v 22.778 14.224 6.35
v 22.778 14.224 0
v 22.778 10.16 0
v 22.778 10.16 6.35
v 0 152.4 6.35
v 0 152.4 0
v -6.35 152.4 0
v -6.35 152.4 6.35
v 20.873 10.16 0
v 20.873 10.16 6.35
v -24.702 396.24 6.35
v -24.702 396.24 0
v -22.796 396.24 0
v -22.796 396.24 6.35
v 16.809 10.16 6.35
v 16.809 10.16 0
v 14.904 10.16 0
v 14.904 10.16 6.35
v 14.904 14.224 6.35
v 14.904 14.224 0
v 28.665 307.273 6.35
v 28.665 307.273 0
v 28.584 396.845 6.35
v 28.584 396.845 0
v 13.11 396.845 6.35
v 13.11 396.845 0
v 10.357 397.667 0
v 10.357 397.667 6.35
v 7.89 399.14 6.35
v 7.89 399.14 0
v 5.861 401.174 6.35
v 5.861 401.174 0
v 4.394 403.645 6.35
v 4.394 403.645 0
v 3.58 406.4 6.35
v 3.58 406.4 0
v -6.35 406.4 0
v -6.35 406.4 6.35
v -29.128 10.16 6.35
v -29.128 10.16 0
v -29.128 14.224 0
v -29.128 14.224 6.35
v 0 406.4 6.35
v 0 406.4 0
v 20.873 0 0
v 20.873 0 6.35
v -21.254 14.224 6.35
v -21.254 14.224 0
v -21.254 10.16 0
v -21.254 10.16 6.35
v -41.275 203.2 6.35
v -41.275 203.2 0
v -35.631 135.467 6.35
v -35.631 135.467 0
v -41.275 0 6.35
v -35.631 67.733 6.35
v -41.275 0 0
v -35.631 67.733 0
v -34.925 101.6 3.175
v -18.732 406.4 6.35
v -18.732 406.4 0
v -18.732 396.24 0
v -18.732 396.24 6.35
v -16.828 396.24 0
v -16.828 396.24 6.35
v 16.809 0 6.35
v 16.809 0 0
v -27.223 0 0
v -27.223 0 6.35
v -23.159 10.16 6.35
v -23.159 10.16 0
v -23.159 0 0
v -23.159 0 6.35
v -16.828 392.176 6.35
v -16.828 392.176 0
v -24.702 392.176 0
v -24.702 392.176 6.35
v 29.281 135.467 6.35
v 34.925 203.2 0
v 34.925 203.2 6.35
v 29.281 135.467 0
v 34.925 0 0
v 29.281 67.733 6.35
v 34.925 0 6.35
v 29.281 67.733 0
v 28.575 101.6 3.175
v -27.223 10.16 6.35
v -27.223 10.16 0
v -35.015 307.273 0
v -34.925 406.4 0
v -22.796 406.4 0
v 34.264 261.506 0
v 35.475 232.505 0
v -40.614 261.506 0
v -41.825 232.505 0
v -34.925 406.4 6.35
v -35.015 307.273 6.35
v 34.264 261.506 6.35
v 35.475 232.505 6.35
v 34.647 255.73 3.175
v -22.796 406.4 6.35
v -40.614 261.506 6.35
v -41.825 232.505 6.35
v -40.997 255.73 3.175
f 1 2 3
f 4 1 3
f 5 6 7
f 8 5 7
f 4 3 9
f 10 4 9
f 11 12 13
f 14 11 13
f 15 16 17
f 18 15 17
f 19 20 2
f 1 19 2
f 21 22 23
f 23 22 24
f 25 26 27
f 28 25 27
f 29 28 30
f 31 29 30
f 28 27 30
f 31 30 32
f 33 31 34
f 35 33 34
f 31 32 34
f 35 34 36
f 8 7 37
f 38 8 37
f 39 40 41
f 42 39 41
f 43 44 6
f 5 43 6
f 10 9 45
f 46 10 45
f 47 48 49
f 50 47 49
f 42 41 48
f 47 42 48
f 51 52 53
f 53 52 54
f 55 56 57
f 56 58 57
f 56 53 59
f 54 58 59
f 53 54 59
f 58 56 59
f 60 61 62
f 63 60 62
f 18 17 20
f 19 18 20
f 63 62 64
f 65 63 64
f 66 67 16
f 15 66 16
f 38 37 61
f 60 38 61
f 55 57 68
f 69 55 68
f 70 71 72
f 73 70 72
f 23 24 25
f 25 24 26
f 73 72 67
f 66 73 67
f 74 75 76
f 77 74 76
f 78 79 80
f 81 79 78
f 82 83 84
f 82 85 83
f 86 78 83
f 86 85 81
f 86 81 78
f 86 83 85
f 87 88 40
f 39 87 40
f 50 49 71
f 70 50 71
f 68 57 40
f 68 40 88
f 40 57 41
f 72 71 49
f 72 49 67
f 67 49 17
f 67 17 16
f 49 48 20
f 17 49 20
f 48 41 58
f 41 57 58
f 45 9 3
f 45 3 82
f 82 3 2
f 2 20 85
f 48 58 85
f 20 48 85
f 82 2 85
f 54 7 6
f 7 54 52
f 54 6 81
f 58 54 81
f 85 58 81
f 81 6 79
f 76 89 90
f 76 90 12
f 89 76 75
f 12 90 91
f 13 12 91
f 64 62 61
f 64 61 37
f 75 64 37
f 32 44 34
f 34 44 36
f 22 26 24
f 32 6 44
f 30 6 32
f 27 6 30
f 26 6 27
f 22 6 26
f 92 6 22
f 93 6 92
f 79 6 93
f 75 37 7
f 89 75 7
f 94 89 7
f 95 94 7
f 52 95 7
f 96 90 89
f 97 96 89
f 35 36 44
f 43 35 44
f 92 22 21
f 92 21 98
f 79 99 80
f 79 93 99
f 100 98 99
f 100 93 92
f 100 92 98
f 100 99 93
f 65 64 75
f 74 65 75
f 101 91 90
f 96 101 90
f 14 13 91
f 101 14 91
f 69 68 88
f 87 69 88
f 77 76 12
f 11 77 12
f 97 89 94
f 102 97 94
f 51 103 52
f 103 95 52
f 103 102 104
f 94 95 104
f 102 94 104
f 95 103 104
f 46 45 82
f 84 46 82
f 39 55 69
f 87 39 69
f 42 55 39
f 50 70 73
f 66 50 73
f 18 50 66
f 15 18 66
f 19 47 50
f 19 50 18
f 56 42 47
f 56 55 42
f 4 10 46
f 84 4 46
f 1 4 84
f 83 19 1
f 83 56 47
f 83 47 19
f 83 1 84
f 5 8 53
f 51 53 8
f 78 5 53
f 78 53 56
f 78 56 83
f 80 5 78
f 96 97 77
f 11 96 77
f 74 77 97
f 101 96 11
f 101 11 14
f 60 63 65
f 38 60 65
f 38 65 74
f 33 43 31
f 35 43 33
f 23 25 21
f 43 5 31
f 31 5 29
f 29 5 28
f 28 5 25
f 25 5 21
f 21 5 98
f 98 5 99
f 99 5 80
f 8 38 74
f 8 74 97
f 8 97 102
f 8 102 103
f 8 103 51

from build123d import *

# Parameters (mm, degrees)
BOSS_EXTRUDE1_DEPTH = 6.35


with BuildPart() as part:
    # Sketch2 → Boss-Extrude1 (new body)
    with BuildSketch(Plane.XY):
        with BuildLine():
            Line((-41.275, 0), (-27.223297828, 0))
            Line((-27.223297828, 0), (-27.223297828, 10.16))
            Line((-27.223297828, 10.16), (-29.128297828, 10.16))
            Line((-29.128297828, 10.16), (-29.128297828, 14.224))
            Line((-29.128297828, 14.224), (-21.254297828, 14.224))
            Line((-21.254297828, 14.224), (-21.254297828, 10.16))
            Line((-21.254297828, 10.16), (-23.159297828, 10.16))
            Line((-23.159297828, 10.16), (-23.159297828, 0))
            Line((-23.159297828, 0), (16.809297828, 0))
            Line((16.809297828, 0), (16.809297828, 10.16))
            Line((16.809297828, 10.16), (14.904297828, 10.16))
            Line((14.904297828, 10.16), (14.904297828, 14.224))
            Line((14.904297828, 14.224), (22.778297828, 14.224))
            Line((22.778297828, 14.224), (22.778297828, 10.16))
            Line((22.778297828, 10.16), (20.873297828, 10.16))
            Line((20.873297828, 10.16), (20.873297828, 0))
            Line((20.873297828, 0), (34.925, 0))
            add(Edge.make_bspline(
                [(34.925, 203.2), (22.225, 101.6), (34.925, 0)],
                knots=[0, 0, 0, 1, 1, 1], degree=2))
            add(Edge.make_bspline(
                [(28.665162854, 307.273451332), (37.499078487, 256.223776594), (34.925, 203.2)],
                knots=[0.49744374, 0.49744374, 0.49744374, 1, 1, 1], degree=2))
            Line((28.665162854, 307.273451332), (28.583690525, 396.845491603))
            Line((28.583690525, 396.845491603), (13.109843668, 396.845491603))
            ThreePointArc((13.109843668, 396.845491603), (6.812169641, 400.09411622), (3.579509775, 406.4))
            Line((3.579509775, 406.4), (0, 406.4))
            Line((0, 406.4), (0, 152.4))
            Line((0, 152.4), (-6.35, 152.4))
            Line((-6.35, 152.4), (-6.35, 406.4))
            Line((-6.35, 406.4), (-18.7325, 406.4))
            Line((-18.7325, 406.4), (-18.7325, 396.24))
            Line((-18.7325, 396.24), (-16.8275, 396.24))
            Line((-16.8275, 396.24), (-16.8275, 392.176))
            Line((-16.8275, 392.176), (-20.7645, 392.176))
            Line((-20.7645, 392.176), (-24.7015, 392.176))
            Line((-24.7015, 392.176), (-24.7015, 396.24))
            Line((-24.7015, 396.24), (-22.7965, 396.24))
            Line((-22.7965, 396.24), (-22.7965, 406.4))
            Line((-22.7965, 406.4), (-34.925, 406.4))
            Line((-34.925, 406.4), (-35.015162854, 307.273451332))
            add(Edge.make_bspline(
                [(-35.015162854, 307.273451332), (-43.849078487, 256.223776594), (-41.275, 203.2)],
                knots=[0.49744374, 0.49744374, 0.49744374, 1, 1, 1], degree=2))
            add(Edge.make_bspline(
                [(-41.275, 203.2), (-28.575, 101.6), (-41.275, 0)],
                knots=[0, 0, 0, 1, 1, 1], degree=2))
        make_face()
    extrude(amount=BOSS_EXTRUDE1_DEPTH)


solid = part.part
